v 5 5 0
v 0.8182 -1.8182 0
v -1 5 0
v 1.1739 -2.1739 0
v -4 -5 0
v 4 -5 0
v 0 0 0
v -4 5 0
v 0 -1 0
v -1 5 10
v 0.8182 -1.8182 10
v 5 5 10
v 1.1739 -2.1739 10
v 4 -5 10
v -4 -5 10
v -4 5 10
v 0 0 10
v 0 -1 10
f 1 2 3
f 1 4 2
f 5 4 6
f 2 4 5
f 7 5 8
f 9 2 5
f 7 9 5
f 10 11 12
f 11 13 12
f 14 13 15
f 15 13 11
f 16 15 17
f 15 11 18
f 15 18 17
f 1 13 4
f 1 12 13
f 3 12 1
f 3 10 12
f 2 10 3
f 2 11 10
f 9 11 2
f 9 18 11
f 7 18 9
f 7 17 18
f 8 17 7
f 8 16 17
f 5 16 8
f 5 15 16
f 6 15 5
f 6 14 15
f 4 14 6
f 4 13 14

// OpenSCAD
/* use with -gran=1 */
linear_extrude(height = 10) {
    polygon(
        points=[
            [ 0, 0],
            [ 0, -1],
            [ 4, -5],
            [-4, -5],
            [-4, +5],
        ]
    );
    polygon(
        points=[
            [-1, +5],
            [+1, -2.5],
            [+5, +5]
        ]
    );
}
